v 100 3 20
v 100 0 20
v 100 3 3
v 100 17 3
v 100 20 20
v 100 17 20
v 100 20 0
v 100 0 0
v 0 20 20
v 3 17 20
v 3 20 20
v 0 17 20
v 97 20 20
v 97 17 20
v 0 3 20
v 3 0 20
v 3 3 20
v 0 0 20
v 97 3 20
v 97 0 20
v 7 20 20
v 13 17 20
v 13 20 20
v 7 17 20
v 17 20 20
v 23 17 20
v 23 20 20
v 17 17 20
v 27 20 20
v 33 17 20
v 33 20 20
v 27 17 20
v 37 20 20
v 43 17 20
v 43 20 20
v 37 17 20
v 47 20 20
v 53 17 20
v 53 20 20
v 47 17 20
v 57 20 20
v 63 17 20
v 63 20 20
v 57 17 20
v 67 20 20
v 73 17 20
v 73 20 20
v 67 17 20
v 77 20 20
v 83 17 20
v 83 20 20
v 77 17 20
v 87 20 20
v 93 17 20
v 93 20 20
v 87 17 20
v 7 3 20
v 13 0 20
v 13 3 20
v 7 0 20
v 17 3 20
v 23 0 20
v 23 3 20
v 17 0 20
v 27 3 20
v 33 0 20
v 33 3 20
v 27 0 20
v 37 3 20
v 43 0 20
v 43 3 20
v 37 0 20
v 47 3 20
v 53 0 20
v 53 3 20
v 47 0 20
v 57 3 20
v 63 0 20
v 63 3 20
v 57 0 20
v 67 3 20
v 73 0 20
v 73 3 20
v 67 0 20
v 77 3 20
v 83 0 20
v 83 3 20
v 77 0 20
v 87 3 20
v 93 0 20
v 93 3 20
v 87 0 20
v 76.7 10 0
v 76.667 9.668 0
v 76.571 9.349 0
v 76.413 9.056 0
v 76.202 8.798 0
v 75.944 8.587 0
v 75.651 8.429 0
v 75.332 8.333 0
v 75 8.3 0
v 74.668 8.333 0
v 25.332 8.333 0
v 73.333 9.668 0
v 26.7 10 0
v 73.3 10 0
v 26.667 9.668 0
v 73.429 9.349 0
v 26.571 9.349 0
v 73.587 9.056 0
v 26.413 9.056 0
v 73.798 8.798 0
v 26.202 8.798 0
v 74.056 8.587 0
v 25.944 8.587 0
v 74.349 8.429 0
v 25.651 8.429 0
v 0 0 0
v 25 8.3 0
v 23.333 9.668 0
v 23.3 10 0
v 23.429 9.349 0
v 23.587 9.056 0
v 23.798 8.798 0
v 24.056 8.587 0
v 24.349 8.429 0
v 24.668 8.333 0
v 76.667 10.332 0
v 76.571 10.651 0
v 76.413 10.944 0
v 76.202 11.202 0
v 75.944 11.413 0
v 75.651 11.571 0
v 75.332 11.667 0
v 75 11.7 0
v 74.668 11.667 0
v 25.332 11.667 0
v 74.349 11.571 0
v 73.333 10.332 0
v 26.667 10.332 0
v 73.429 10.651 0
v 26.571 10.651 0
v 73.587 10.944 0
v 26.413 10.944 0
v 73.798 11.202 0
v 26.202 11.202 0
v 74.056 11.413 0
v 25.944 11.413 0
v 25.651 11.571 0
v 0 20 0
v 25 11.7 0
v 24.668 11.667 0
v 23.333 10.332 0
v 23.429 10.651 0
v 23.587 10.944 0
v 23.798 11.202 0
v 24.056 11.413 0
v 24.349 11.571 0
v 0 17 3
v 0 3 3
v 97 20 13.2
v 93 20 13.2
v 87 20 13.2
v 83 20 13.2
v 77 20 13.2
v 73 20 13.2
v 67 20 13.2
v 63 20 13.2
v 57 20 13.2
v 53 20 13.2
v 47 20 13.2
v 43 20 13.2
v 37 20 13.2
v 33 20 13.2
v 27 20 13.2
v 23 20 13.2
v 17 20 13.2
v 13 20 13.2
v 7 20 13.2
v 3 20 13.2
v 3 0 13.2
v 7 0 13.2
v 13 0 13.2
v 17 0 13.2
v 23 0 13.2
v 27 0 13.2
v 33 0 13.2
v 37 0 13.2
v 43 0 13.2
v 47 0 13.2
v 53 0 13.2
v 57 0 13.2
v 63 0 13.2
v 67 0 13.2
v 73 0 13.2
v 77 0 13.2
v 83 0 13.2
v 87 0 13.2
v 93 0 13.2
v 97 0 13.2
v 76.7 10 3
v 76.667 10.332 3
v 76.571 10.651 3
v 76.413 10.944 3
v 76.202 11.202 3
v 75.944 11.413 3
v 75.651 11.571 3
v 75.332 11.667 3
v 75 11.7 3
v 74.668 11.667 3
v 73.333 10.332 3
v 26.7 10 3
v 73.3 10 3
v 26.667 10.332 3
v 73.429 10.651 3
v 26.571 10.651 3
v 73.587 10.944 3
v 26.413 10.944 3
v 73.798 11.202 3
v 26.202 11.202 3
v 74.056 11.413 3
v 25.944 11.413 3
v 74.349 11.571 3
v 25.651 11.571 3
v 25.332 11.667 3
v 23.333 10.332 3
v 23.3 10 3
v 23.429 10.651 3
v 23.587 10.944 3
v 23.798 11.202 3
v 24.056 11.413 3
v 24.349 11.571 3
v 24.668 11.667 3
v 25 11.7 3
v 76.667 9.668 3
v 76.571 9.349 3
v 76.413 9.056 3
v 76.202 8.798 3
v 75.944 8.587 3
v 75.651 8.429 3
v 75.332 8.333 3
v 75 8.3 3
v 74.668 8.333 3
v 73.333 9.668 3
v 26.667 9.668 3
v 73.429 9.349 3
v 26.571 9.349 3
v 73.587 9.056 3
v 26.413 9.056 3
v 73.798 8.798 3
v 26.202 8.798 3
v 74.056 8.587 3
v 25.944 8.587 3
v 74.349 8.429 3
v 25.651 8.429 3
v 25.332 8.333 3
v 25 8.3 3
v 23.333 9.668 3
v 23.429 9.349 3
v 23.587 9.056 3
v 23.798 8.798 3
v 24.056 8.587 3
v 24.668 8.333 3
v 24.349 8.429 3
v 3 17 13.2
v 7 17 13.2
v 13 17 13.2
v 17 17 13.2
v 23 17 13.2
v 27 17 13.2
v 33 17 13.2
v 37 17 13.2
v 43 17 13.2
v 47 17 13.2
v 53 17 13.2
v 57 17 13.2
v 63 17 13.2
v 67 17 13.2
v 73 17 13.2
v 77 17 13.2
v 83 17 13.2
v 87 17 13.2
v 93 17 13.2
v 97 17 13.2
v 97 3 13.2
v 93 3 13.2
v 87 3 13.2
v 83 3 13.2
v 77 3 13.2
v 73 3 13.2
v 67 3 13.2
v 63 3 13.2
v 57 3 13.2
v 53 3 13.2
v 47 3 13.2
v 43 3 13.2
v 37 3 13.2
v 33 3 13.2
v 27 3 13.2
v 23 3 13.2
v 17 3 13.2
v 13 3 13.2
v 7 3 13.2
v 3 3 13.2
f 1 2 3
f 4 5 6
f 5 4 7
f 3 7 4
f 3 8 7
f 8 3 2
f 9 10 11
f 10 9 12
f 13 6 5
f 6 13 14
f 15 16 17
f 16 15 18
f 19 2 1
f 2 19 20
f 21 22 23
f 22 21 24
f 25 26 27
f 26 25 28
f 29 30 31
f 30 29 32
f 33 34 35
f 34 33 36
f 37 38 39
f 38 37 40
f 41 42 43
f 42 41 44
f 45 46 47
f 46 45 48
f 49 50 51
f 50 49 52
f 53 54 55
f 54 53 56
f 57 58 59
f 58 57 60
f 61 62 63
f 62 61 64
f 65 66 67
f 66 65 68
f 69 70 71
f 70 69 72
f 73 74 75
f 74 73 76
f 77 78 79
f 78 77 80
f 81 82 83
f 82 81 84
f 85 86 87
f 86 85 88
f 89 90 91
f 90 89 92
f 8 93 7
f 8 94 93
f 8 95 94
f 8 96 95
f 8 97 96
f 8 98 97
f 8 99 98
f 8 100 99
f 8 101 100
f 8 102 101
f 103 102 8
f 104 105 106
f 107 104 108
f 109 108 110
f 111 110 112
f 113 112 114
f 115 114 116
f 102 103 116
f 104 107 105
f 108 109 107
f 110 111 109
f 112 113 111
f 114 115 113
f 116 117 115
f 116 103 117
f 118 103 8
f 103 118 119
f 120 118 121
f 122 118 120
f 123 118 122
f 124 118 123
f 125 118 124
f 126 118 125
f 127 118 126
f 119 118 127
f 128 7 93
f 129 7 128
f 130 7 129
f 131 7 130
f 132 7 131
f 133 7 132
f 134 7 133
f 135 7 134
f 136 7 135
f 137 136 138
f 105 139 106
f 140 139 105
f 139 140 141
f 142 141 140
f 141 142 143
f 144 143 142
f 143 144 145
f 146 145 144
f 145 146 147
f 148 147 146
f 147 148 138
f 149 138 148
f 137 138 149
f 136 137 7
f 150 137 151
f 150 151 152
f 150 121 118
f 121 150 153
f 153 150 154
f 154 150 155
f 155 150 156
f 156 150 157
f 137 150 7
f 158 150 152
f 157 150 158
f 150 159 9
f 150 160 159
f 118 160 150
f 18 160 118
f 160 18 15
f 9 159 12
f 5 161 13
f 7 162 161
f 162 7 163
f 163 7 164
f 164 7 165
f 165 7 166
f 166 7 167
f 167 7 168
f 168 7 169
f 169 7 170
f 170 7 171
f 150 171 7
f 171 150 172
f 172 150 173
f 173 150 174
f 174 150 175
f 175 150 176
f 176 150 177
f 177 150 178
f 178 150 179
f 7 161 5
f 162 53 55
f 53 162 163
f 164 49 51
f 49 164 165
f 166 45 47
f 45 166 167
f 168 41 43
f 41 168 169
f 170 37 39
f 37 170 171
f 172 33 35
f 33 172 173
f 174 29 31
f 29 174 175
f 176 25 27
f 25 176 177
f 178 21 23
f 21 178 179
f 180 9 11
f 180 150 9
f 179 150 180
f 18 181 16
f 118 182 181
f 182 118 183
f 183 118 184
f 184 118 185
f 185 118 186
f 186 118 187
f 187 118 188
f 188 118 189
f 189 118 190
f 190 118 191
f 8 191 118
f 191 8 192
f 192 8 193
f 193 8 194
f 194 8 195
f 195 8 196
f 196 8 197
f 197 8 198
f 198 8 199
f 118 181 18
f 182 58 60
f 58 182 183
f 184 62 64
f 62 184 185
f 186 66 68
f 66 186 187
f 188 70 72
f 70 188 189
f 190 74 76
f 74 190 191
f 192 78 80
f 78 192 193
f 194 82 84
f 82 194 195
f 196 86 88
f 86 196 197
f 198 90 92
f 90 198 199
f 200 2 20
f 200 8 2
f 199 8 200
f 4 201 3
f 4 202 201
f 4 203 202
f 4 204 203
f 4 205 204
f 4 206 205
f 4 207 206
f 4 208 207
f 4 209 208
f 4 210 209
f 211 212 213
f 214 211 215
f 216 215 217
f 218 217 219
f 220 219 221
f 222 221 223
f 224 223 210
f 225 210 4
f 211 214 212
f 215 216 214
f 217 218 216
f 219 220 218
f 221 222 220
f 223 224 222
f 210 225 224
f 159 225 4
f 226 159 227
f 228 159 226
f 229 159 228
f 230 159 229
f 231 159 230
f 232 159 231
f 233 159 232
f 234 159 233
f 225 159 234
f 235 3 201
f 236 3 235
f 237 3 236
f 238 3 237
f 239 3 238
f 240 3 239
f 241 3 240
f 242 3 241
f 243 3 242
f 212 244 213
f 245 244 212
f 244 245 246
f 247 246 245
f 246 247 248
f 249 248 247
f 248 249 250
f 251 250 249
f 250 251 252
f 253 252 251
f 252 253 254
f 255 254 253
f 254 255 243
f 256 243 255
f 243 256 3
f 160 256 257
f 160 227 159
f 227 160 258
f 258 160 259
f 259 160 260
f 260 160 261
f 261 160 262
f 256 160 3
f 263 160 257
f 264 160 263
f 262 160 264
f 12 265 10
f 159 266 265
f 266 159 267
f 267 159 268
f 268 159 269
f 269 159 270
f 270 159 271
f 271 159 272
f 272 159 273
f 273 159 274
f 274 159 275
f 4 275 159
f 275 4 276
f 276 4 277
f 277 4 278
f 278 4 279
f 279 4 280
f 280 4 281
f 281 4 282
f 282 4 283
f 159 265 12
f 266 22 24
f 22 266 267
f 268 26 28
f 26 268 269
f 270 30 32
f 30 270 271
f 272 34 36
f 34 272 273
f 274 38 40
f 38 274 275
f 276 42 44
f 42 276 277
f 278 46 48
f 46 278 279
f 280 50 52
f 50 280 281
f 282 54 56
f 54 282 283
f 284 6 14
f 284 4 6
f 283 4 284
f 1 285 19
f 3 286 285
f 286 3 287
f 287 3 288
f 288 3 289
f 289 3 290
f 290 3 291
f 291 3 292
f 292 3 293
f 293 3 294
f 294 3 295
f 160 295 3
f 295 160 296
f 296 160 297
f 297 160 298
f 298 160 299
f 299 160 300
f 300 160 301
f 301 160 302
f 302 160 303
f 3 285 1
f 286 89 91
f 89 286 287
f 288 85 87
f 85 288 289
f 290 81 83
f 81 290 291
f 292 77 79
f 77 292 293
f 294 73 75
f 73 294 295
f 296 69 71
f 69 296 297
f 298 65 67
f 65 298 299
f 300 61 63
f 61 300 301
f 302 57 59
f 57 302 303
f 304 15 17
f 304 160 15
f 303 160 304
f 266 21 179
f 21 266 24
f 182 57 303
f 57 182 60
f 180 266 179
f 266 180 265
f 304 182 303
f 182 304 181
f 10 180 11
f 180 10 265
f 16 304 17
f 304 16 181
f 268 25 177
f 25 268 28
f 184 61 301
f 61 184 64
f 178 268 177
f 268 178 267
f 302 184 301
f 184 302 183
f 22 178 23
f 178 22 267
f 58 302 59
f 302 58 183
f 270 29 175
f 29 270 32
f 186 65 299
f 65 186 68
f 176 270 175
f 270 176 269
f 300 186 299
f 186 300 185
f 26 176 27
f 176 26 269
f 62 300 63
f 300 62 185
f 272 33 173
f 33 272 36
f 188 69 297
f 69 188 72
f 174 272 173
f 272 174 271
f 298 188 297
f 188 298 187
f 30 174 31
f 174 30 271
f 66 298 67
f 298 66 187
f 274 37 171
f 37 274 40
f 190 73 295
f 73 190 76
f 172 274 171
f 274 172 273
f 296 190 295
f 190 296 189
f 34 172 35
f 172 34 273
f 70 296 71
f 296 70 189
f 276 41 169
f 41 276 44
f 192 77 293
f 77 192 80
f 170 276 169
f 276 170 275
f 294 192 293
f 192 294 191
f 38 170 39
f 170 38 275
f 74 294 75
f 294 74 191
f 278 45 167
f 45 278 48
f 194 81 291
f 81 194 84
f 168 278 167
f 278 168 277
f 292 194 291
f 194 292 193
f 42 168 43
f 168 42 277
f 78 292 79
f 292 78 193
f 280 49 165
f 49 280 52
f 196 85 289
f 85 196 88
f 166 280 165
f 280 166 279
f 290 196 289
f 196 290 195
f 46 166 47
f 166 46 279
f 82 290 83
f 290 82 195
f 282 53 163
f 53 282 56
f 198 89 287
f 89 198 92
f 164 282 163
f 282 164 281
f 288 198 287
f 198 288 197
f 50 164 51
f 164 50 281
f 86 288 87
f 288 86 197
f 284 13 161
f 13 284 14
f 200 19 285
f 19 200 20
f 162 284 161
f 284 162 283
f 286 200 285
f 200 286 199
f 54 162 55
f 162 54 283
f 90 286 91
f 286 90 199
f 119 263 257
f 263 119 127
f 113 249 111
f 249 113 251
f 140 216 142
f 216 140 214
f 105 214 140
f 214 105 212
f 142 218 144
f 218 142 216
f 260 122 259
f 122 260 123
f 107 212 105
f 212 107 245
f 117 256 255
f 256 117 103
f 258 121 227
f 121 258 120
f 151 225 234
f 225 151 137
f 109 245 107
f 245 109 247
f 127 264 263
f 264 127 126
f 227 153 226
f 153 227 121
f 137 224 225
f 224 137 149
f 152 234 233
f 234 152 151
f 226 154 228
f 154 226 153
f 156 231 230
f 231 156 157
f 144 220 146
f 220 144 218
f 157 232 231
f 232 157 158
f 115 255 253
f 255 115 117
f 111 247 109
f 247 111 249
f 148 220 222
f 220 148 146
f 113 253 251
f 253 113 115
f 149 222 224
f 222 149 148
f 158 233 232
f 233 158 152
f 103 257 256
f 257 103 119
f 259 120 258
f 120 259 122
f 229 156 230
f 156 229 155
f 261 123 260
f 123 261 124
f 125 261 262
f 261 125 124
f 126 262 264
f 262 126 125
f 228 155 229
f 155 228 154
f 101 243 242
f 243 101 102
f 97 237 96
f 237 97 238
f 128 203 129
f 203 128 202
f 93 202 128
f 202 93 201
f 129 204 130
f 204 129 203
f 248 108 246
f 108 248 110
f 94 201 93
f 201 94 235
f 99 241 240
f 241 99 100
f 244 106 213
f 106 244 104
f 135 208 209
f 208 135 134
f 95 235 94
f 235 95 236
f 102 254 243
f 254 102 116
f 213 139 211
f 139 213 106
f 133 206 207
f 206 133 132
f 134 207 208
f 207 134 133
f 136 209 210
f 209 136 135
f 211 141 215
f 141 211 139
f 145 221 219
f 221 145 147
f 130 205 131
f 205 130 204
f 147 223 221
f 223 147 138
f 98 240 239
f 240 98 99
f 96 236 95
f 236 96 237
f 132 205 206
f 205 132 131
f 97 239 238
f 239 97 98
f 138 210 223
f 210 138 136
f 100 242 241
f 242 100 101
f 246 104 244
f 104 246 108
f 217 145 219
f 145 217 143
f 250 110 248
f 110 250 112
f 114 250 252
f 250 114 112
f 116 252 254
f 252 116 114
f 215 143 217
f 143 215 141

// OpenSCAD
$fn = 32;

// ----------------------------------------------------------------------
// Cable duct: 100 x 20 x 20 mm, 10 fingers
// ----------------------------------------------------------------------

// --- parameters (mm) ---
tray_len = 100;           // duct length, X
tray_w = 20;              // duct width, Y
tray_h = 20;              // duct height, Z
tray_t = 3;               // side wall thickness
floor_t = 3;              // floor thickness
slot_w = 4;               // finger slot width
slot_h = 10.2;            // finger slot height
fingers = 10;             // number of finger slots per side
pitch = 10;               // finger pitch
hole_d = 3.4;             // floor mounting hole
hole_n = 2;               // mounting holes in the floor

module shell() {
  difference() {
    cube([tray_len, tray_w, tray_h]);
    /* open top channel */
    translate([-tray_t - 1, tray_t, floor_t])
      cube([tray_len + 2 * tray_t + 2, tray_w - 2 * tray_t, tray_h + 1]);
  }
}

difference() {
  union() {
    shell();
  }
  /* finger slots cut through both side walls */
  for (i = [0 : fingers - 1]) translate([pitch / 2 + i * pitch - slot_w / 2, -1, floor_t + slot_h]) cube([slot_w, tray_w + 2, tray_h]);
  for (i = [0 : hole_n - 1]) translate([(tray_len / hole_n) * (i + 0.5), tray_w / 2, -1]) cylinder(h = floor_t + 2, d = hole_d);
}
